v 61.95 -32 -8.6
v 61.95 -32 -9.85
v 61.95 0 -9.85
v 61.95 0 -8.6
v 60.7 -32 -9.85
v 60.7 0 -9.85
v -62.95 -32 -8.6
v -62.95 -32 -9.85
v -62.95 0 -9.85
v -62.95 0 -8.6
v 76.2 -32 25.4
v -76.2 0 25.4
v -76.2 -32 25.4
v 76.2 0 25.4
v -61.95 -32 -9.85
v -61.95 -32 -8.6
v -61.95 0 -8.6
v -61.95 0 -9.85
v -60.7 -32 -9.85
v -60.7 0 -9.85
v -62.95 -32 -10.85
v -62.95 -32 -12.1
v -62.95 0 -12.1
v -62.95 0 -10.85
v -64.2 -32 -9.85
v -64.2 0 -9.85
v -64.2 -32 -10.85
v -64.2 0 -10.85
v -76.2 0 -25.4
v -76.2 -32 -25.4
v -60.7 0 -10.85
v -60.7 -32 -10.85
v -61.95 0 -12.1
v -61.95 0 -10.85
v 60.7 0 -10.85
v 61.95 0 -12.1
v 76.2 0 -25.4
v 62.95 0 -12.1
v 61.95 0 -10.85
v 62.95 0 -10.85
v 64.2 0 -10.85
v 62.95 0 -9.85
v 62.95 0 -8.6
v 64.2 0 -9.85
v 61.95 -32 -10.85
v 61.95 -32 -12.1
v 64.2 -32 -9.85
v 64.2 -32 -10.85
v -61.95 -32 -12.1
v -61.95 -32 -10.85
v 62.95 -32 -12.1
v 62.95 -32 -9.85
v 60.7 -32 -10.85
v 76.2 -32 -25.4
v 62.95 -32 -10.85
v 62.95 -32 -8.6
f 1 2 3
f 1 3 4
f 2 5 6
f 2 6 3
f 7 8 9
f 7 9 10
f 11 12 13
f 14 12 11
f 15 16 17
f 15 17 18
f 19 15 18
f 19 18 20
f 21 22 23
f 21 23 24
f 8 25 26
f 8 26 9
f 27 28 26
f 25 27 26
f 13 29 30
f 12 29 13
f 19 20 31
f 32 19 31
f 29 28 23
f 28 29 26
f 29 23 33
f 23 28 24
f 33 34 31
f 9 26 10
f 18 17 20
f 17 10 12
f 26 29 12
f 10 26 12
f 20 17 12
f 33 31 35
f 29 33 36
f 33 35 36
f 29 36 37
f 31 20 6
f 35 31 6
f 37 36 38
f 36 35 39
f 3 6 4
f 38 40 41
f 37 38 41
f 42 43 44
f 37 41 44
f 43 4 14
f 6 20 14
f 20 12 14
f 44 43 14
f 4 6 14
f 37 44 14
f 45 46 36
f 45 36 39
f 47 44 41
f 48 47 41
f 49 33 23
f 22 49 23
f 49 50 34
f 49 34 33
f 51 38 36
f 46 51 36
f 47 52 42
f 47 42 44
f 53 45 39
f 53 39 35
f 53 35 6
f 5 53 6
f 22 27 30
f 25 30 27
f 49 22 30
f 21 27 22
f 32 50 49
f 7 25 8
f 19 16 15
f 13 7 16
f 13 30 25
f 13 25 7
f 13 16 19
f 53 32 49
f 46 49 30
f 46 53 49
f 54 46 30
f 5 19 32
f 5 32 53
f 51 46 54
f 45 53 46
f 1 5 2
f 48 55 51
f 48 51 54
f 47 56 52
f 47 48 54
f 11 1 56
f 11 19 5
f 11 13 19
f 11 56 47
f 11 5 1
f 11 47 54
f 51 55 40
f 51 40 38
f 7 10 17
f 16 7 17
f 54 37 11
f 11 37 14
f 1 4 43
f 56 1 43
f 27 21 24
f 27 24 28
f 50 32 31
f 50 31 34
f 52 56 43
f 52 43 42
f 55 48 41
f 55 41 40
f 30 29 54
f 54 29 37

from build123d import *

# Parameters (mm, degrees)
F0_W     = 152.4
F0_H     = 50.8
F1_DEPTH = 32


with BuildPart() as f1:
    # F0 (on Front) → F1 (new body)
    with BuildSketch(Plane.XZ):
        Rectangle(F0_W, F0_H)
        Polygon((-62.95, -9.85), (-62.95, -8.6), (-61.95, -8.6), (-61.95, -9.85), (-60.7, -9.85), (-60.7, -10.85), (-61.95, -10.85), (-61.95, -12.1), (-62.95, -12.1), (-62.95, -10.85), (-64.2, -10.85), (-64.2, -9.85), align=None, mode=Mode.SUBTRACT)
        Polygon((60.7, -9.85), (61.95, -9.85), (61.95, -8.6), (62.95, -8.6), (62.95, -9.85), (64.2, -9.85), (64.2, -10.85), (62.95, -10.85), (62.95, -12.1), (61.95, -12.1), (61.95, -10.85), (60.7, -10.85), align=None, mode=Mode.SUBTRACT)
    extrude(amount=F1_DEPTH)


solid = f1.part
